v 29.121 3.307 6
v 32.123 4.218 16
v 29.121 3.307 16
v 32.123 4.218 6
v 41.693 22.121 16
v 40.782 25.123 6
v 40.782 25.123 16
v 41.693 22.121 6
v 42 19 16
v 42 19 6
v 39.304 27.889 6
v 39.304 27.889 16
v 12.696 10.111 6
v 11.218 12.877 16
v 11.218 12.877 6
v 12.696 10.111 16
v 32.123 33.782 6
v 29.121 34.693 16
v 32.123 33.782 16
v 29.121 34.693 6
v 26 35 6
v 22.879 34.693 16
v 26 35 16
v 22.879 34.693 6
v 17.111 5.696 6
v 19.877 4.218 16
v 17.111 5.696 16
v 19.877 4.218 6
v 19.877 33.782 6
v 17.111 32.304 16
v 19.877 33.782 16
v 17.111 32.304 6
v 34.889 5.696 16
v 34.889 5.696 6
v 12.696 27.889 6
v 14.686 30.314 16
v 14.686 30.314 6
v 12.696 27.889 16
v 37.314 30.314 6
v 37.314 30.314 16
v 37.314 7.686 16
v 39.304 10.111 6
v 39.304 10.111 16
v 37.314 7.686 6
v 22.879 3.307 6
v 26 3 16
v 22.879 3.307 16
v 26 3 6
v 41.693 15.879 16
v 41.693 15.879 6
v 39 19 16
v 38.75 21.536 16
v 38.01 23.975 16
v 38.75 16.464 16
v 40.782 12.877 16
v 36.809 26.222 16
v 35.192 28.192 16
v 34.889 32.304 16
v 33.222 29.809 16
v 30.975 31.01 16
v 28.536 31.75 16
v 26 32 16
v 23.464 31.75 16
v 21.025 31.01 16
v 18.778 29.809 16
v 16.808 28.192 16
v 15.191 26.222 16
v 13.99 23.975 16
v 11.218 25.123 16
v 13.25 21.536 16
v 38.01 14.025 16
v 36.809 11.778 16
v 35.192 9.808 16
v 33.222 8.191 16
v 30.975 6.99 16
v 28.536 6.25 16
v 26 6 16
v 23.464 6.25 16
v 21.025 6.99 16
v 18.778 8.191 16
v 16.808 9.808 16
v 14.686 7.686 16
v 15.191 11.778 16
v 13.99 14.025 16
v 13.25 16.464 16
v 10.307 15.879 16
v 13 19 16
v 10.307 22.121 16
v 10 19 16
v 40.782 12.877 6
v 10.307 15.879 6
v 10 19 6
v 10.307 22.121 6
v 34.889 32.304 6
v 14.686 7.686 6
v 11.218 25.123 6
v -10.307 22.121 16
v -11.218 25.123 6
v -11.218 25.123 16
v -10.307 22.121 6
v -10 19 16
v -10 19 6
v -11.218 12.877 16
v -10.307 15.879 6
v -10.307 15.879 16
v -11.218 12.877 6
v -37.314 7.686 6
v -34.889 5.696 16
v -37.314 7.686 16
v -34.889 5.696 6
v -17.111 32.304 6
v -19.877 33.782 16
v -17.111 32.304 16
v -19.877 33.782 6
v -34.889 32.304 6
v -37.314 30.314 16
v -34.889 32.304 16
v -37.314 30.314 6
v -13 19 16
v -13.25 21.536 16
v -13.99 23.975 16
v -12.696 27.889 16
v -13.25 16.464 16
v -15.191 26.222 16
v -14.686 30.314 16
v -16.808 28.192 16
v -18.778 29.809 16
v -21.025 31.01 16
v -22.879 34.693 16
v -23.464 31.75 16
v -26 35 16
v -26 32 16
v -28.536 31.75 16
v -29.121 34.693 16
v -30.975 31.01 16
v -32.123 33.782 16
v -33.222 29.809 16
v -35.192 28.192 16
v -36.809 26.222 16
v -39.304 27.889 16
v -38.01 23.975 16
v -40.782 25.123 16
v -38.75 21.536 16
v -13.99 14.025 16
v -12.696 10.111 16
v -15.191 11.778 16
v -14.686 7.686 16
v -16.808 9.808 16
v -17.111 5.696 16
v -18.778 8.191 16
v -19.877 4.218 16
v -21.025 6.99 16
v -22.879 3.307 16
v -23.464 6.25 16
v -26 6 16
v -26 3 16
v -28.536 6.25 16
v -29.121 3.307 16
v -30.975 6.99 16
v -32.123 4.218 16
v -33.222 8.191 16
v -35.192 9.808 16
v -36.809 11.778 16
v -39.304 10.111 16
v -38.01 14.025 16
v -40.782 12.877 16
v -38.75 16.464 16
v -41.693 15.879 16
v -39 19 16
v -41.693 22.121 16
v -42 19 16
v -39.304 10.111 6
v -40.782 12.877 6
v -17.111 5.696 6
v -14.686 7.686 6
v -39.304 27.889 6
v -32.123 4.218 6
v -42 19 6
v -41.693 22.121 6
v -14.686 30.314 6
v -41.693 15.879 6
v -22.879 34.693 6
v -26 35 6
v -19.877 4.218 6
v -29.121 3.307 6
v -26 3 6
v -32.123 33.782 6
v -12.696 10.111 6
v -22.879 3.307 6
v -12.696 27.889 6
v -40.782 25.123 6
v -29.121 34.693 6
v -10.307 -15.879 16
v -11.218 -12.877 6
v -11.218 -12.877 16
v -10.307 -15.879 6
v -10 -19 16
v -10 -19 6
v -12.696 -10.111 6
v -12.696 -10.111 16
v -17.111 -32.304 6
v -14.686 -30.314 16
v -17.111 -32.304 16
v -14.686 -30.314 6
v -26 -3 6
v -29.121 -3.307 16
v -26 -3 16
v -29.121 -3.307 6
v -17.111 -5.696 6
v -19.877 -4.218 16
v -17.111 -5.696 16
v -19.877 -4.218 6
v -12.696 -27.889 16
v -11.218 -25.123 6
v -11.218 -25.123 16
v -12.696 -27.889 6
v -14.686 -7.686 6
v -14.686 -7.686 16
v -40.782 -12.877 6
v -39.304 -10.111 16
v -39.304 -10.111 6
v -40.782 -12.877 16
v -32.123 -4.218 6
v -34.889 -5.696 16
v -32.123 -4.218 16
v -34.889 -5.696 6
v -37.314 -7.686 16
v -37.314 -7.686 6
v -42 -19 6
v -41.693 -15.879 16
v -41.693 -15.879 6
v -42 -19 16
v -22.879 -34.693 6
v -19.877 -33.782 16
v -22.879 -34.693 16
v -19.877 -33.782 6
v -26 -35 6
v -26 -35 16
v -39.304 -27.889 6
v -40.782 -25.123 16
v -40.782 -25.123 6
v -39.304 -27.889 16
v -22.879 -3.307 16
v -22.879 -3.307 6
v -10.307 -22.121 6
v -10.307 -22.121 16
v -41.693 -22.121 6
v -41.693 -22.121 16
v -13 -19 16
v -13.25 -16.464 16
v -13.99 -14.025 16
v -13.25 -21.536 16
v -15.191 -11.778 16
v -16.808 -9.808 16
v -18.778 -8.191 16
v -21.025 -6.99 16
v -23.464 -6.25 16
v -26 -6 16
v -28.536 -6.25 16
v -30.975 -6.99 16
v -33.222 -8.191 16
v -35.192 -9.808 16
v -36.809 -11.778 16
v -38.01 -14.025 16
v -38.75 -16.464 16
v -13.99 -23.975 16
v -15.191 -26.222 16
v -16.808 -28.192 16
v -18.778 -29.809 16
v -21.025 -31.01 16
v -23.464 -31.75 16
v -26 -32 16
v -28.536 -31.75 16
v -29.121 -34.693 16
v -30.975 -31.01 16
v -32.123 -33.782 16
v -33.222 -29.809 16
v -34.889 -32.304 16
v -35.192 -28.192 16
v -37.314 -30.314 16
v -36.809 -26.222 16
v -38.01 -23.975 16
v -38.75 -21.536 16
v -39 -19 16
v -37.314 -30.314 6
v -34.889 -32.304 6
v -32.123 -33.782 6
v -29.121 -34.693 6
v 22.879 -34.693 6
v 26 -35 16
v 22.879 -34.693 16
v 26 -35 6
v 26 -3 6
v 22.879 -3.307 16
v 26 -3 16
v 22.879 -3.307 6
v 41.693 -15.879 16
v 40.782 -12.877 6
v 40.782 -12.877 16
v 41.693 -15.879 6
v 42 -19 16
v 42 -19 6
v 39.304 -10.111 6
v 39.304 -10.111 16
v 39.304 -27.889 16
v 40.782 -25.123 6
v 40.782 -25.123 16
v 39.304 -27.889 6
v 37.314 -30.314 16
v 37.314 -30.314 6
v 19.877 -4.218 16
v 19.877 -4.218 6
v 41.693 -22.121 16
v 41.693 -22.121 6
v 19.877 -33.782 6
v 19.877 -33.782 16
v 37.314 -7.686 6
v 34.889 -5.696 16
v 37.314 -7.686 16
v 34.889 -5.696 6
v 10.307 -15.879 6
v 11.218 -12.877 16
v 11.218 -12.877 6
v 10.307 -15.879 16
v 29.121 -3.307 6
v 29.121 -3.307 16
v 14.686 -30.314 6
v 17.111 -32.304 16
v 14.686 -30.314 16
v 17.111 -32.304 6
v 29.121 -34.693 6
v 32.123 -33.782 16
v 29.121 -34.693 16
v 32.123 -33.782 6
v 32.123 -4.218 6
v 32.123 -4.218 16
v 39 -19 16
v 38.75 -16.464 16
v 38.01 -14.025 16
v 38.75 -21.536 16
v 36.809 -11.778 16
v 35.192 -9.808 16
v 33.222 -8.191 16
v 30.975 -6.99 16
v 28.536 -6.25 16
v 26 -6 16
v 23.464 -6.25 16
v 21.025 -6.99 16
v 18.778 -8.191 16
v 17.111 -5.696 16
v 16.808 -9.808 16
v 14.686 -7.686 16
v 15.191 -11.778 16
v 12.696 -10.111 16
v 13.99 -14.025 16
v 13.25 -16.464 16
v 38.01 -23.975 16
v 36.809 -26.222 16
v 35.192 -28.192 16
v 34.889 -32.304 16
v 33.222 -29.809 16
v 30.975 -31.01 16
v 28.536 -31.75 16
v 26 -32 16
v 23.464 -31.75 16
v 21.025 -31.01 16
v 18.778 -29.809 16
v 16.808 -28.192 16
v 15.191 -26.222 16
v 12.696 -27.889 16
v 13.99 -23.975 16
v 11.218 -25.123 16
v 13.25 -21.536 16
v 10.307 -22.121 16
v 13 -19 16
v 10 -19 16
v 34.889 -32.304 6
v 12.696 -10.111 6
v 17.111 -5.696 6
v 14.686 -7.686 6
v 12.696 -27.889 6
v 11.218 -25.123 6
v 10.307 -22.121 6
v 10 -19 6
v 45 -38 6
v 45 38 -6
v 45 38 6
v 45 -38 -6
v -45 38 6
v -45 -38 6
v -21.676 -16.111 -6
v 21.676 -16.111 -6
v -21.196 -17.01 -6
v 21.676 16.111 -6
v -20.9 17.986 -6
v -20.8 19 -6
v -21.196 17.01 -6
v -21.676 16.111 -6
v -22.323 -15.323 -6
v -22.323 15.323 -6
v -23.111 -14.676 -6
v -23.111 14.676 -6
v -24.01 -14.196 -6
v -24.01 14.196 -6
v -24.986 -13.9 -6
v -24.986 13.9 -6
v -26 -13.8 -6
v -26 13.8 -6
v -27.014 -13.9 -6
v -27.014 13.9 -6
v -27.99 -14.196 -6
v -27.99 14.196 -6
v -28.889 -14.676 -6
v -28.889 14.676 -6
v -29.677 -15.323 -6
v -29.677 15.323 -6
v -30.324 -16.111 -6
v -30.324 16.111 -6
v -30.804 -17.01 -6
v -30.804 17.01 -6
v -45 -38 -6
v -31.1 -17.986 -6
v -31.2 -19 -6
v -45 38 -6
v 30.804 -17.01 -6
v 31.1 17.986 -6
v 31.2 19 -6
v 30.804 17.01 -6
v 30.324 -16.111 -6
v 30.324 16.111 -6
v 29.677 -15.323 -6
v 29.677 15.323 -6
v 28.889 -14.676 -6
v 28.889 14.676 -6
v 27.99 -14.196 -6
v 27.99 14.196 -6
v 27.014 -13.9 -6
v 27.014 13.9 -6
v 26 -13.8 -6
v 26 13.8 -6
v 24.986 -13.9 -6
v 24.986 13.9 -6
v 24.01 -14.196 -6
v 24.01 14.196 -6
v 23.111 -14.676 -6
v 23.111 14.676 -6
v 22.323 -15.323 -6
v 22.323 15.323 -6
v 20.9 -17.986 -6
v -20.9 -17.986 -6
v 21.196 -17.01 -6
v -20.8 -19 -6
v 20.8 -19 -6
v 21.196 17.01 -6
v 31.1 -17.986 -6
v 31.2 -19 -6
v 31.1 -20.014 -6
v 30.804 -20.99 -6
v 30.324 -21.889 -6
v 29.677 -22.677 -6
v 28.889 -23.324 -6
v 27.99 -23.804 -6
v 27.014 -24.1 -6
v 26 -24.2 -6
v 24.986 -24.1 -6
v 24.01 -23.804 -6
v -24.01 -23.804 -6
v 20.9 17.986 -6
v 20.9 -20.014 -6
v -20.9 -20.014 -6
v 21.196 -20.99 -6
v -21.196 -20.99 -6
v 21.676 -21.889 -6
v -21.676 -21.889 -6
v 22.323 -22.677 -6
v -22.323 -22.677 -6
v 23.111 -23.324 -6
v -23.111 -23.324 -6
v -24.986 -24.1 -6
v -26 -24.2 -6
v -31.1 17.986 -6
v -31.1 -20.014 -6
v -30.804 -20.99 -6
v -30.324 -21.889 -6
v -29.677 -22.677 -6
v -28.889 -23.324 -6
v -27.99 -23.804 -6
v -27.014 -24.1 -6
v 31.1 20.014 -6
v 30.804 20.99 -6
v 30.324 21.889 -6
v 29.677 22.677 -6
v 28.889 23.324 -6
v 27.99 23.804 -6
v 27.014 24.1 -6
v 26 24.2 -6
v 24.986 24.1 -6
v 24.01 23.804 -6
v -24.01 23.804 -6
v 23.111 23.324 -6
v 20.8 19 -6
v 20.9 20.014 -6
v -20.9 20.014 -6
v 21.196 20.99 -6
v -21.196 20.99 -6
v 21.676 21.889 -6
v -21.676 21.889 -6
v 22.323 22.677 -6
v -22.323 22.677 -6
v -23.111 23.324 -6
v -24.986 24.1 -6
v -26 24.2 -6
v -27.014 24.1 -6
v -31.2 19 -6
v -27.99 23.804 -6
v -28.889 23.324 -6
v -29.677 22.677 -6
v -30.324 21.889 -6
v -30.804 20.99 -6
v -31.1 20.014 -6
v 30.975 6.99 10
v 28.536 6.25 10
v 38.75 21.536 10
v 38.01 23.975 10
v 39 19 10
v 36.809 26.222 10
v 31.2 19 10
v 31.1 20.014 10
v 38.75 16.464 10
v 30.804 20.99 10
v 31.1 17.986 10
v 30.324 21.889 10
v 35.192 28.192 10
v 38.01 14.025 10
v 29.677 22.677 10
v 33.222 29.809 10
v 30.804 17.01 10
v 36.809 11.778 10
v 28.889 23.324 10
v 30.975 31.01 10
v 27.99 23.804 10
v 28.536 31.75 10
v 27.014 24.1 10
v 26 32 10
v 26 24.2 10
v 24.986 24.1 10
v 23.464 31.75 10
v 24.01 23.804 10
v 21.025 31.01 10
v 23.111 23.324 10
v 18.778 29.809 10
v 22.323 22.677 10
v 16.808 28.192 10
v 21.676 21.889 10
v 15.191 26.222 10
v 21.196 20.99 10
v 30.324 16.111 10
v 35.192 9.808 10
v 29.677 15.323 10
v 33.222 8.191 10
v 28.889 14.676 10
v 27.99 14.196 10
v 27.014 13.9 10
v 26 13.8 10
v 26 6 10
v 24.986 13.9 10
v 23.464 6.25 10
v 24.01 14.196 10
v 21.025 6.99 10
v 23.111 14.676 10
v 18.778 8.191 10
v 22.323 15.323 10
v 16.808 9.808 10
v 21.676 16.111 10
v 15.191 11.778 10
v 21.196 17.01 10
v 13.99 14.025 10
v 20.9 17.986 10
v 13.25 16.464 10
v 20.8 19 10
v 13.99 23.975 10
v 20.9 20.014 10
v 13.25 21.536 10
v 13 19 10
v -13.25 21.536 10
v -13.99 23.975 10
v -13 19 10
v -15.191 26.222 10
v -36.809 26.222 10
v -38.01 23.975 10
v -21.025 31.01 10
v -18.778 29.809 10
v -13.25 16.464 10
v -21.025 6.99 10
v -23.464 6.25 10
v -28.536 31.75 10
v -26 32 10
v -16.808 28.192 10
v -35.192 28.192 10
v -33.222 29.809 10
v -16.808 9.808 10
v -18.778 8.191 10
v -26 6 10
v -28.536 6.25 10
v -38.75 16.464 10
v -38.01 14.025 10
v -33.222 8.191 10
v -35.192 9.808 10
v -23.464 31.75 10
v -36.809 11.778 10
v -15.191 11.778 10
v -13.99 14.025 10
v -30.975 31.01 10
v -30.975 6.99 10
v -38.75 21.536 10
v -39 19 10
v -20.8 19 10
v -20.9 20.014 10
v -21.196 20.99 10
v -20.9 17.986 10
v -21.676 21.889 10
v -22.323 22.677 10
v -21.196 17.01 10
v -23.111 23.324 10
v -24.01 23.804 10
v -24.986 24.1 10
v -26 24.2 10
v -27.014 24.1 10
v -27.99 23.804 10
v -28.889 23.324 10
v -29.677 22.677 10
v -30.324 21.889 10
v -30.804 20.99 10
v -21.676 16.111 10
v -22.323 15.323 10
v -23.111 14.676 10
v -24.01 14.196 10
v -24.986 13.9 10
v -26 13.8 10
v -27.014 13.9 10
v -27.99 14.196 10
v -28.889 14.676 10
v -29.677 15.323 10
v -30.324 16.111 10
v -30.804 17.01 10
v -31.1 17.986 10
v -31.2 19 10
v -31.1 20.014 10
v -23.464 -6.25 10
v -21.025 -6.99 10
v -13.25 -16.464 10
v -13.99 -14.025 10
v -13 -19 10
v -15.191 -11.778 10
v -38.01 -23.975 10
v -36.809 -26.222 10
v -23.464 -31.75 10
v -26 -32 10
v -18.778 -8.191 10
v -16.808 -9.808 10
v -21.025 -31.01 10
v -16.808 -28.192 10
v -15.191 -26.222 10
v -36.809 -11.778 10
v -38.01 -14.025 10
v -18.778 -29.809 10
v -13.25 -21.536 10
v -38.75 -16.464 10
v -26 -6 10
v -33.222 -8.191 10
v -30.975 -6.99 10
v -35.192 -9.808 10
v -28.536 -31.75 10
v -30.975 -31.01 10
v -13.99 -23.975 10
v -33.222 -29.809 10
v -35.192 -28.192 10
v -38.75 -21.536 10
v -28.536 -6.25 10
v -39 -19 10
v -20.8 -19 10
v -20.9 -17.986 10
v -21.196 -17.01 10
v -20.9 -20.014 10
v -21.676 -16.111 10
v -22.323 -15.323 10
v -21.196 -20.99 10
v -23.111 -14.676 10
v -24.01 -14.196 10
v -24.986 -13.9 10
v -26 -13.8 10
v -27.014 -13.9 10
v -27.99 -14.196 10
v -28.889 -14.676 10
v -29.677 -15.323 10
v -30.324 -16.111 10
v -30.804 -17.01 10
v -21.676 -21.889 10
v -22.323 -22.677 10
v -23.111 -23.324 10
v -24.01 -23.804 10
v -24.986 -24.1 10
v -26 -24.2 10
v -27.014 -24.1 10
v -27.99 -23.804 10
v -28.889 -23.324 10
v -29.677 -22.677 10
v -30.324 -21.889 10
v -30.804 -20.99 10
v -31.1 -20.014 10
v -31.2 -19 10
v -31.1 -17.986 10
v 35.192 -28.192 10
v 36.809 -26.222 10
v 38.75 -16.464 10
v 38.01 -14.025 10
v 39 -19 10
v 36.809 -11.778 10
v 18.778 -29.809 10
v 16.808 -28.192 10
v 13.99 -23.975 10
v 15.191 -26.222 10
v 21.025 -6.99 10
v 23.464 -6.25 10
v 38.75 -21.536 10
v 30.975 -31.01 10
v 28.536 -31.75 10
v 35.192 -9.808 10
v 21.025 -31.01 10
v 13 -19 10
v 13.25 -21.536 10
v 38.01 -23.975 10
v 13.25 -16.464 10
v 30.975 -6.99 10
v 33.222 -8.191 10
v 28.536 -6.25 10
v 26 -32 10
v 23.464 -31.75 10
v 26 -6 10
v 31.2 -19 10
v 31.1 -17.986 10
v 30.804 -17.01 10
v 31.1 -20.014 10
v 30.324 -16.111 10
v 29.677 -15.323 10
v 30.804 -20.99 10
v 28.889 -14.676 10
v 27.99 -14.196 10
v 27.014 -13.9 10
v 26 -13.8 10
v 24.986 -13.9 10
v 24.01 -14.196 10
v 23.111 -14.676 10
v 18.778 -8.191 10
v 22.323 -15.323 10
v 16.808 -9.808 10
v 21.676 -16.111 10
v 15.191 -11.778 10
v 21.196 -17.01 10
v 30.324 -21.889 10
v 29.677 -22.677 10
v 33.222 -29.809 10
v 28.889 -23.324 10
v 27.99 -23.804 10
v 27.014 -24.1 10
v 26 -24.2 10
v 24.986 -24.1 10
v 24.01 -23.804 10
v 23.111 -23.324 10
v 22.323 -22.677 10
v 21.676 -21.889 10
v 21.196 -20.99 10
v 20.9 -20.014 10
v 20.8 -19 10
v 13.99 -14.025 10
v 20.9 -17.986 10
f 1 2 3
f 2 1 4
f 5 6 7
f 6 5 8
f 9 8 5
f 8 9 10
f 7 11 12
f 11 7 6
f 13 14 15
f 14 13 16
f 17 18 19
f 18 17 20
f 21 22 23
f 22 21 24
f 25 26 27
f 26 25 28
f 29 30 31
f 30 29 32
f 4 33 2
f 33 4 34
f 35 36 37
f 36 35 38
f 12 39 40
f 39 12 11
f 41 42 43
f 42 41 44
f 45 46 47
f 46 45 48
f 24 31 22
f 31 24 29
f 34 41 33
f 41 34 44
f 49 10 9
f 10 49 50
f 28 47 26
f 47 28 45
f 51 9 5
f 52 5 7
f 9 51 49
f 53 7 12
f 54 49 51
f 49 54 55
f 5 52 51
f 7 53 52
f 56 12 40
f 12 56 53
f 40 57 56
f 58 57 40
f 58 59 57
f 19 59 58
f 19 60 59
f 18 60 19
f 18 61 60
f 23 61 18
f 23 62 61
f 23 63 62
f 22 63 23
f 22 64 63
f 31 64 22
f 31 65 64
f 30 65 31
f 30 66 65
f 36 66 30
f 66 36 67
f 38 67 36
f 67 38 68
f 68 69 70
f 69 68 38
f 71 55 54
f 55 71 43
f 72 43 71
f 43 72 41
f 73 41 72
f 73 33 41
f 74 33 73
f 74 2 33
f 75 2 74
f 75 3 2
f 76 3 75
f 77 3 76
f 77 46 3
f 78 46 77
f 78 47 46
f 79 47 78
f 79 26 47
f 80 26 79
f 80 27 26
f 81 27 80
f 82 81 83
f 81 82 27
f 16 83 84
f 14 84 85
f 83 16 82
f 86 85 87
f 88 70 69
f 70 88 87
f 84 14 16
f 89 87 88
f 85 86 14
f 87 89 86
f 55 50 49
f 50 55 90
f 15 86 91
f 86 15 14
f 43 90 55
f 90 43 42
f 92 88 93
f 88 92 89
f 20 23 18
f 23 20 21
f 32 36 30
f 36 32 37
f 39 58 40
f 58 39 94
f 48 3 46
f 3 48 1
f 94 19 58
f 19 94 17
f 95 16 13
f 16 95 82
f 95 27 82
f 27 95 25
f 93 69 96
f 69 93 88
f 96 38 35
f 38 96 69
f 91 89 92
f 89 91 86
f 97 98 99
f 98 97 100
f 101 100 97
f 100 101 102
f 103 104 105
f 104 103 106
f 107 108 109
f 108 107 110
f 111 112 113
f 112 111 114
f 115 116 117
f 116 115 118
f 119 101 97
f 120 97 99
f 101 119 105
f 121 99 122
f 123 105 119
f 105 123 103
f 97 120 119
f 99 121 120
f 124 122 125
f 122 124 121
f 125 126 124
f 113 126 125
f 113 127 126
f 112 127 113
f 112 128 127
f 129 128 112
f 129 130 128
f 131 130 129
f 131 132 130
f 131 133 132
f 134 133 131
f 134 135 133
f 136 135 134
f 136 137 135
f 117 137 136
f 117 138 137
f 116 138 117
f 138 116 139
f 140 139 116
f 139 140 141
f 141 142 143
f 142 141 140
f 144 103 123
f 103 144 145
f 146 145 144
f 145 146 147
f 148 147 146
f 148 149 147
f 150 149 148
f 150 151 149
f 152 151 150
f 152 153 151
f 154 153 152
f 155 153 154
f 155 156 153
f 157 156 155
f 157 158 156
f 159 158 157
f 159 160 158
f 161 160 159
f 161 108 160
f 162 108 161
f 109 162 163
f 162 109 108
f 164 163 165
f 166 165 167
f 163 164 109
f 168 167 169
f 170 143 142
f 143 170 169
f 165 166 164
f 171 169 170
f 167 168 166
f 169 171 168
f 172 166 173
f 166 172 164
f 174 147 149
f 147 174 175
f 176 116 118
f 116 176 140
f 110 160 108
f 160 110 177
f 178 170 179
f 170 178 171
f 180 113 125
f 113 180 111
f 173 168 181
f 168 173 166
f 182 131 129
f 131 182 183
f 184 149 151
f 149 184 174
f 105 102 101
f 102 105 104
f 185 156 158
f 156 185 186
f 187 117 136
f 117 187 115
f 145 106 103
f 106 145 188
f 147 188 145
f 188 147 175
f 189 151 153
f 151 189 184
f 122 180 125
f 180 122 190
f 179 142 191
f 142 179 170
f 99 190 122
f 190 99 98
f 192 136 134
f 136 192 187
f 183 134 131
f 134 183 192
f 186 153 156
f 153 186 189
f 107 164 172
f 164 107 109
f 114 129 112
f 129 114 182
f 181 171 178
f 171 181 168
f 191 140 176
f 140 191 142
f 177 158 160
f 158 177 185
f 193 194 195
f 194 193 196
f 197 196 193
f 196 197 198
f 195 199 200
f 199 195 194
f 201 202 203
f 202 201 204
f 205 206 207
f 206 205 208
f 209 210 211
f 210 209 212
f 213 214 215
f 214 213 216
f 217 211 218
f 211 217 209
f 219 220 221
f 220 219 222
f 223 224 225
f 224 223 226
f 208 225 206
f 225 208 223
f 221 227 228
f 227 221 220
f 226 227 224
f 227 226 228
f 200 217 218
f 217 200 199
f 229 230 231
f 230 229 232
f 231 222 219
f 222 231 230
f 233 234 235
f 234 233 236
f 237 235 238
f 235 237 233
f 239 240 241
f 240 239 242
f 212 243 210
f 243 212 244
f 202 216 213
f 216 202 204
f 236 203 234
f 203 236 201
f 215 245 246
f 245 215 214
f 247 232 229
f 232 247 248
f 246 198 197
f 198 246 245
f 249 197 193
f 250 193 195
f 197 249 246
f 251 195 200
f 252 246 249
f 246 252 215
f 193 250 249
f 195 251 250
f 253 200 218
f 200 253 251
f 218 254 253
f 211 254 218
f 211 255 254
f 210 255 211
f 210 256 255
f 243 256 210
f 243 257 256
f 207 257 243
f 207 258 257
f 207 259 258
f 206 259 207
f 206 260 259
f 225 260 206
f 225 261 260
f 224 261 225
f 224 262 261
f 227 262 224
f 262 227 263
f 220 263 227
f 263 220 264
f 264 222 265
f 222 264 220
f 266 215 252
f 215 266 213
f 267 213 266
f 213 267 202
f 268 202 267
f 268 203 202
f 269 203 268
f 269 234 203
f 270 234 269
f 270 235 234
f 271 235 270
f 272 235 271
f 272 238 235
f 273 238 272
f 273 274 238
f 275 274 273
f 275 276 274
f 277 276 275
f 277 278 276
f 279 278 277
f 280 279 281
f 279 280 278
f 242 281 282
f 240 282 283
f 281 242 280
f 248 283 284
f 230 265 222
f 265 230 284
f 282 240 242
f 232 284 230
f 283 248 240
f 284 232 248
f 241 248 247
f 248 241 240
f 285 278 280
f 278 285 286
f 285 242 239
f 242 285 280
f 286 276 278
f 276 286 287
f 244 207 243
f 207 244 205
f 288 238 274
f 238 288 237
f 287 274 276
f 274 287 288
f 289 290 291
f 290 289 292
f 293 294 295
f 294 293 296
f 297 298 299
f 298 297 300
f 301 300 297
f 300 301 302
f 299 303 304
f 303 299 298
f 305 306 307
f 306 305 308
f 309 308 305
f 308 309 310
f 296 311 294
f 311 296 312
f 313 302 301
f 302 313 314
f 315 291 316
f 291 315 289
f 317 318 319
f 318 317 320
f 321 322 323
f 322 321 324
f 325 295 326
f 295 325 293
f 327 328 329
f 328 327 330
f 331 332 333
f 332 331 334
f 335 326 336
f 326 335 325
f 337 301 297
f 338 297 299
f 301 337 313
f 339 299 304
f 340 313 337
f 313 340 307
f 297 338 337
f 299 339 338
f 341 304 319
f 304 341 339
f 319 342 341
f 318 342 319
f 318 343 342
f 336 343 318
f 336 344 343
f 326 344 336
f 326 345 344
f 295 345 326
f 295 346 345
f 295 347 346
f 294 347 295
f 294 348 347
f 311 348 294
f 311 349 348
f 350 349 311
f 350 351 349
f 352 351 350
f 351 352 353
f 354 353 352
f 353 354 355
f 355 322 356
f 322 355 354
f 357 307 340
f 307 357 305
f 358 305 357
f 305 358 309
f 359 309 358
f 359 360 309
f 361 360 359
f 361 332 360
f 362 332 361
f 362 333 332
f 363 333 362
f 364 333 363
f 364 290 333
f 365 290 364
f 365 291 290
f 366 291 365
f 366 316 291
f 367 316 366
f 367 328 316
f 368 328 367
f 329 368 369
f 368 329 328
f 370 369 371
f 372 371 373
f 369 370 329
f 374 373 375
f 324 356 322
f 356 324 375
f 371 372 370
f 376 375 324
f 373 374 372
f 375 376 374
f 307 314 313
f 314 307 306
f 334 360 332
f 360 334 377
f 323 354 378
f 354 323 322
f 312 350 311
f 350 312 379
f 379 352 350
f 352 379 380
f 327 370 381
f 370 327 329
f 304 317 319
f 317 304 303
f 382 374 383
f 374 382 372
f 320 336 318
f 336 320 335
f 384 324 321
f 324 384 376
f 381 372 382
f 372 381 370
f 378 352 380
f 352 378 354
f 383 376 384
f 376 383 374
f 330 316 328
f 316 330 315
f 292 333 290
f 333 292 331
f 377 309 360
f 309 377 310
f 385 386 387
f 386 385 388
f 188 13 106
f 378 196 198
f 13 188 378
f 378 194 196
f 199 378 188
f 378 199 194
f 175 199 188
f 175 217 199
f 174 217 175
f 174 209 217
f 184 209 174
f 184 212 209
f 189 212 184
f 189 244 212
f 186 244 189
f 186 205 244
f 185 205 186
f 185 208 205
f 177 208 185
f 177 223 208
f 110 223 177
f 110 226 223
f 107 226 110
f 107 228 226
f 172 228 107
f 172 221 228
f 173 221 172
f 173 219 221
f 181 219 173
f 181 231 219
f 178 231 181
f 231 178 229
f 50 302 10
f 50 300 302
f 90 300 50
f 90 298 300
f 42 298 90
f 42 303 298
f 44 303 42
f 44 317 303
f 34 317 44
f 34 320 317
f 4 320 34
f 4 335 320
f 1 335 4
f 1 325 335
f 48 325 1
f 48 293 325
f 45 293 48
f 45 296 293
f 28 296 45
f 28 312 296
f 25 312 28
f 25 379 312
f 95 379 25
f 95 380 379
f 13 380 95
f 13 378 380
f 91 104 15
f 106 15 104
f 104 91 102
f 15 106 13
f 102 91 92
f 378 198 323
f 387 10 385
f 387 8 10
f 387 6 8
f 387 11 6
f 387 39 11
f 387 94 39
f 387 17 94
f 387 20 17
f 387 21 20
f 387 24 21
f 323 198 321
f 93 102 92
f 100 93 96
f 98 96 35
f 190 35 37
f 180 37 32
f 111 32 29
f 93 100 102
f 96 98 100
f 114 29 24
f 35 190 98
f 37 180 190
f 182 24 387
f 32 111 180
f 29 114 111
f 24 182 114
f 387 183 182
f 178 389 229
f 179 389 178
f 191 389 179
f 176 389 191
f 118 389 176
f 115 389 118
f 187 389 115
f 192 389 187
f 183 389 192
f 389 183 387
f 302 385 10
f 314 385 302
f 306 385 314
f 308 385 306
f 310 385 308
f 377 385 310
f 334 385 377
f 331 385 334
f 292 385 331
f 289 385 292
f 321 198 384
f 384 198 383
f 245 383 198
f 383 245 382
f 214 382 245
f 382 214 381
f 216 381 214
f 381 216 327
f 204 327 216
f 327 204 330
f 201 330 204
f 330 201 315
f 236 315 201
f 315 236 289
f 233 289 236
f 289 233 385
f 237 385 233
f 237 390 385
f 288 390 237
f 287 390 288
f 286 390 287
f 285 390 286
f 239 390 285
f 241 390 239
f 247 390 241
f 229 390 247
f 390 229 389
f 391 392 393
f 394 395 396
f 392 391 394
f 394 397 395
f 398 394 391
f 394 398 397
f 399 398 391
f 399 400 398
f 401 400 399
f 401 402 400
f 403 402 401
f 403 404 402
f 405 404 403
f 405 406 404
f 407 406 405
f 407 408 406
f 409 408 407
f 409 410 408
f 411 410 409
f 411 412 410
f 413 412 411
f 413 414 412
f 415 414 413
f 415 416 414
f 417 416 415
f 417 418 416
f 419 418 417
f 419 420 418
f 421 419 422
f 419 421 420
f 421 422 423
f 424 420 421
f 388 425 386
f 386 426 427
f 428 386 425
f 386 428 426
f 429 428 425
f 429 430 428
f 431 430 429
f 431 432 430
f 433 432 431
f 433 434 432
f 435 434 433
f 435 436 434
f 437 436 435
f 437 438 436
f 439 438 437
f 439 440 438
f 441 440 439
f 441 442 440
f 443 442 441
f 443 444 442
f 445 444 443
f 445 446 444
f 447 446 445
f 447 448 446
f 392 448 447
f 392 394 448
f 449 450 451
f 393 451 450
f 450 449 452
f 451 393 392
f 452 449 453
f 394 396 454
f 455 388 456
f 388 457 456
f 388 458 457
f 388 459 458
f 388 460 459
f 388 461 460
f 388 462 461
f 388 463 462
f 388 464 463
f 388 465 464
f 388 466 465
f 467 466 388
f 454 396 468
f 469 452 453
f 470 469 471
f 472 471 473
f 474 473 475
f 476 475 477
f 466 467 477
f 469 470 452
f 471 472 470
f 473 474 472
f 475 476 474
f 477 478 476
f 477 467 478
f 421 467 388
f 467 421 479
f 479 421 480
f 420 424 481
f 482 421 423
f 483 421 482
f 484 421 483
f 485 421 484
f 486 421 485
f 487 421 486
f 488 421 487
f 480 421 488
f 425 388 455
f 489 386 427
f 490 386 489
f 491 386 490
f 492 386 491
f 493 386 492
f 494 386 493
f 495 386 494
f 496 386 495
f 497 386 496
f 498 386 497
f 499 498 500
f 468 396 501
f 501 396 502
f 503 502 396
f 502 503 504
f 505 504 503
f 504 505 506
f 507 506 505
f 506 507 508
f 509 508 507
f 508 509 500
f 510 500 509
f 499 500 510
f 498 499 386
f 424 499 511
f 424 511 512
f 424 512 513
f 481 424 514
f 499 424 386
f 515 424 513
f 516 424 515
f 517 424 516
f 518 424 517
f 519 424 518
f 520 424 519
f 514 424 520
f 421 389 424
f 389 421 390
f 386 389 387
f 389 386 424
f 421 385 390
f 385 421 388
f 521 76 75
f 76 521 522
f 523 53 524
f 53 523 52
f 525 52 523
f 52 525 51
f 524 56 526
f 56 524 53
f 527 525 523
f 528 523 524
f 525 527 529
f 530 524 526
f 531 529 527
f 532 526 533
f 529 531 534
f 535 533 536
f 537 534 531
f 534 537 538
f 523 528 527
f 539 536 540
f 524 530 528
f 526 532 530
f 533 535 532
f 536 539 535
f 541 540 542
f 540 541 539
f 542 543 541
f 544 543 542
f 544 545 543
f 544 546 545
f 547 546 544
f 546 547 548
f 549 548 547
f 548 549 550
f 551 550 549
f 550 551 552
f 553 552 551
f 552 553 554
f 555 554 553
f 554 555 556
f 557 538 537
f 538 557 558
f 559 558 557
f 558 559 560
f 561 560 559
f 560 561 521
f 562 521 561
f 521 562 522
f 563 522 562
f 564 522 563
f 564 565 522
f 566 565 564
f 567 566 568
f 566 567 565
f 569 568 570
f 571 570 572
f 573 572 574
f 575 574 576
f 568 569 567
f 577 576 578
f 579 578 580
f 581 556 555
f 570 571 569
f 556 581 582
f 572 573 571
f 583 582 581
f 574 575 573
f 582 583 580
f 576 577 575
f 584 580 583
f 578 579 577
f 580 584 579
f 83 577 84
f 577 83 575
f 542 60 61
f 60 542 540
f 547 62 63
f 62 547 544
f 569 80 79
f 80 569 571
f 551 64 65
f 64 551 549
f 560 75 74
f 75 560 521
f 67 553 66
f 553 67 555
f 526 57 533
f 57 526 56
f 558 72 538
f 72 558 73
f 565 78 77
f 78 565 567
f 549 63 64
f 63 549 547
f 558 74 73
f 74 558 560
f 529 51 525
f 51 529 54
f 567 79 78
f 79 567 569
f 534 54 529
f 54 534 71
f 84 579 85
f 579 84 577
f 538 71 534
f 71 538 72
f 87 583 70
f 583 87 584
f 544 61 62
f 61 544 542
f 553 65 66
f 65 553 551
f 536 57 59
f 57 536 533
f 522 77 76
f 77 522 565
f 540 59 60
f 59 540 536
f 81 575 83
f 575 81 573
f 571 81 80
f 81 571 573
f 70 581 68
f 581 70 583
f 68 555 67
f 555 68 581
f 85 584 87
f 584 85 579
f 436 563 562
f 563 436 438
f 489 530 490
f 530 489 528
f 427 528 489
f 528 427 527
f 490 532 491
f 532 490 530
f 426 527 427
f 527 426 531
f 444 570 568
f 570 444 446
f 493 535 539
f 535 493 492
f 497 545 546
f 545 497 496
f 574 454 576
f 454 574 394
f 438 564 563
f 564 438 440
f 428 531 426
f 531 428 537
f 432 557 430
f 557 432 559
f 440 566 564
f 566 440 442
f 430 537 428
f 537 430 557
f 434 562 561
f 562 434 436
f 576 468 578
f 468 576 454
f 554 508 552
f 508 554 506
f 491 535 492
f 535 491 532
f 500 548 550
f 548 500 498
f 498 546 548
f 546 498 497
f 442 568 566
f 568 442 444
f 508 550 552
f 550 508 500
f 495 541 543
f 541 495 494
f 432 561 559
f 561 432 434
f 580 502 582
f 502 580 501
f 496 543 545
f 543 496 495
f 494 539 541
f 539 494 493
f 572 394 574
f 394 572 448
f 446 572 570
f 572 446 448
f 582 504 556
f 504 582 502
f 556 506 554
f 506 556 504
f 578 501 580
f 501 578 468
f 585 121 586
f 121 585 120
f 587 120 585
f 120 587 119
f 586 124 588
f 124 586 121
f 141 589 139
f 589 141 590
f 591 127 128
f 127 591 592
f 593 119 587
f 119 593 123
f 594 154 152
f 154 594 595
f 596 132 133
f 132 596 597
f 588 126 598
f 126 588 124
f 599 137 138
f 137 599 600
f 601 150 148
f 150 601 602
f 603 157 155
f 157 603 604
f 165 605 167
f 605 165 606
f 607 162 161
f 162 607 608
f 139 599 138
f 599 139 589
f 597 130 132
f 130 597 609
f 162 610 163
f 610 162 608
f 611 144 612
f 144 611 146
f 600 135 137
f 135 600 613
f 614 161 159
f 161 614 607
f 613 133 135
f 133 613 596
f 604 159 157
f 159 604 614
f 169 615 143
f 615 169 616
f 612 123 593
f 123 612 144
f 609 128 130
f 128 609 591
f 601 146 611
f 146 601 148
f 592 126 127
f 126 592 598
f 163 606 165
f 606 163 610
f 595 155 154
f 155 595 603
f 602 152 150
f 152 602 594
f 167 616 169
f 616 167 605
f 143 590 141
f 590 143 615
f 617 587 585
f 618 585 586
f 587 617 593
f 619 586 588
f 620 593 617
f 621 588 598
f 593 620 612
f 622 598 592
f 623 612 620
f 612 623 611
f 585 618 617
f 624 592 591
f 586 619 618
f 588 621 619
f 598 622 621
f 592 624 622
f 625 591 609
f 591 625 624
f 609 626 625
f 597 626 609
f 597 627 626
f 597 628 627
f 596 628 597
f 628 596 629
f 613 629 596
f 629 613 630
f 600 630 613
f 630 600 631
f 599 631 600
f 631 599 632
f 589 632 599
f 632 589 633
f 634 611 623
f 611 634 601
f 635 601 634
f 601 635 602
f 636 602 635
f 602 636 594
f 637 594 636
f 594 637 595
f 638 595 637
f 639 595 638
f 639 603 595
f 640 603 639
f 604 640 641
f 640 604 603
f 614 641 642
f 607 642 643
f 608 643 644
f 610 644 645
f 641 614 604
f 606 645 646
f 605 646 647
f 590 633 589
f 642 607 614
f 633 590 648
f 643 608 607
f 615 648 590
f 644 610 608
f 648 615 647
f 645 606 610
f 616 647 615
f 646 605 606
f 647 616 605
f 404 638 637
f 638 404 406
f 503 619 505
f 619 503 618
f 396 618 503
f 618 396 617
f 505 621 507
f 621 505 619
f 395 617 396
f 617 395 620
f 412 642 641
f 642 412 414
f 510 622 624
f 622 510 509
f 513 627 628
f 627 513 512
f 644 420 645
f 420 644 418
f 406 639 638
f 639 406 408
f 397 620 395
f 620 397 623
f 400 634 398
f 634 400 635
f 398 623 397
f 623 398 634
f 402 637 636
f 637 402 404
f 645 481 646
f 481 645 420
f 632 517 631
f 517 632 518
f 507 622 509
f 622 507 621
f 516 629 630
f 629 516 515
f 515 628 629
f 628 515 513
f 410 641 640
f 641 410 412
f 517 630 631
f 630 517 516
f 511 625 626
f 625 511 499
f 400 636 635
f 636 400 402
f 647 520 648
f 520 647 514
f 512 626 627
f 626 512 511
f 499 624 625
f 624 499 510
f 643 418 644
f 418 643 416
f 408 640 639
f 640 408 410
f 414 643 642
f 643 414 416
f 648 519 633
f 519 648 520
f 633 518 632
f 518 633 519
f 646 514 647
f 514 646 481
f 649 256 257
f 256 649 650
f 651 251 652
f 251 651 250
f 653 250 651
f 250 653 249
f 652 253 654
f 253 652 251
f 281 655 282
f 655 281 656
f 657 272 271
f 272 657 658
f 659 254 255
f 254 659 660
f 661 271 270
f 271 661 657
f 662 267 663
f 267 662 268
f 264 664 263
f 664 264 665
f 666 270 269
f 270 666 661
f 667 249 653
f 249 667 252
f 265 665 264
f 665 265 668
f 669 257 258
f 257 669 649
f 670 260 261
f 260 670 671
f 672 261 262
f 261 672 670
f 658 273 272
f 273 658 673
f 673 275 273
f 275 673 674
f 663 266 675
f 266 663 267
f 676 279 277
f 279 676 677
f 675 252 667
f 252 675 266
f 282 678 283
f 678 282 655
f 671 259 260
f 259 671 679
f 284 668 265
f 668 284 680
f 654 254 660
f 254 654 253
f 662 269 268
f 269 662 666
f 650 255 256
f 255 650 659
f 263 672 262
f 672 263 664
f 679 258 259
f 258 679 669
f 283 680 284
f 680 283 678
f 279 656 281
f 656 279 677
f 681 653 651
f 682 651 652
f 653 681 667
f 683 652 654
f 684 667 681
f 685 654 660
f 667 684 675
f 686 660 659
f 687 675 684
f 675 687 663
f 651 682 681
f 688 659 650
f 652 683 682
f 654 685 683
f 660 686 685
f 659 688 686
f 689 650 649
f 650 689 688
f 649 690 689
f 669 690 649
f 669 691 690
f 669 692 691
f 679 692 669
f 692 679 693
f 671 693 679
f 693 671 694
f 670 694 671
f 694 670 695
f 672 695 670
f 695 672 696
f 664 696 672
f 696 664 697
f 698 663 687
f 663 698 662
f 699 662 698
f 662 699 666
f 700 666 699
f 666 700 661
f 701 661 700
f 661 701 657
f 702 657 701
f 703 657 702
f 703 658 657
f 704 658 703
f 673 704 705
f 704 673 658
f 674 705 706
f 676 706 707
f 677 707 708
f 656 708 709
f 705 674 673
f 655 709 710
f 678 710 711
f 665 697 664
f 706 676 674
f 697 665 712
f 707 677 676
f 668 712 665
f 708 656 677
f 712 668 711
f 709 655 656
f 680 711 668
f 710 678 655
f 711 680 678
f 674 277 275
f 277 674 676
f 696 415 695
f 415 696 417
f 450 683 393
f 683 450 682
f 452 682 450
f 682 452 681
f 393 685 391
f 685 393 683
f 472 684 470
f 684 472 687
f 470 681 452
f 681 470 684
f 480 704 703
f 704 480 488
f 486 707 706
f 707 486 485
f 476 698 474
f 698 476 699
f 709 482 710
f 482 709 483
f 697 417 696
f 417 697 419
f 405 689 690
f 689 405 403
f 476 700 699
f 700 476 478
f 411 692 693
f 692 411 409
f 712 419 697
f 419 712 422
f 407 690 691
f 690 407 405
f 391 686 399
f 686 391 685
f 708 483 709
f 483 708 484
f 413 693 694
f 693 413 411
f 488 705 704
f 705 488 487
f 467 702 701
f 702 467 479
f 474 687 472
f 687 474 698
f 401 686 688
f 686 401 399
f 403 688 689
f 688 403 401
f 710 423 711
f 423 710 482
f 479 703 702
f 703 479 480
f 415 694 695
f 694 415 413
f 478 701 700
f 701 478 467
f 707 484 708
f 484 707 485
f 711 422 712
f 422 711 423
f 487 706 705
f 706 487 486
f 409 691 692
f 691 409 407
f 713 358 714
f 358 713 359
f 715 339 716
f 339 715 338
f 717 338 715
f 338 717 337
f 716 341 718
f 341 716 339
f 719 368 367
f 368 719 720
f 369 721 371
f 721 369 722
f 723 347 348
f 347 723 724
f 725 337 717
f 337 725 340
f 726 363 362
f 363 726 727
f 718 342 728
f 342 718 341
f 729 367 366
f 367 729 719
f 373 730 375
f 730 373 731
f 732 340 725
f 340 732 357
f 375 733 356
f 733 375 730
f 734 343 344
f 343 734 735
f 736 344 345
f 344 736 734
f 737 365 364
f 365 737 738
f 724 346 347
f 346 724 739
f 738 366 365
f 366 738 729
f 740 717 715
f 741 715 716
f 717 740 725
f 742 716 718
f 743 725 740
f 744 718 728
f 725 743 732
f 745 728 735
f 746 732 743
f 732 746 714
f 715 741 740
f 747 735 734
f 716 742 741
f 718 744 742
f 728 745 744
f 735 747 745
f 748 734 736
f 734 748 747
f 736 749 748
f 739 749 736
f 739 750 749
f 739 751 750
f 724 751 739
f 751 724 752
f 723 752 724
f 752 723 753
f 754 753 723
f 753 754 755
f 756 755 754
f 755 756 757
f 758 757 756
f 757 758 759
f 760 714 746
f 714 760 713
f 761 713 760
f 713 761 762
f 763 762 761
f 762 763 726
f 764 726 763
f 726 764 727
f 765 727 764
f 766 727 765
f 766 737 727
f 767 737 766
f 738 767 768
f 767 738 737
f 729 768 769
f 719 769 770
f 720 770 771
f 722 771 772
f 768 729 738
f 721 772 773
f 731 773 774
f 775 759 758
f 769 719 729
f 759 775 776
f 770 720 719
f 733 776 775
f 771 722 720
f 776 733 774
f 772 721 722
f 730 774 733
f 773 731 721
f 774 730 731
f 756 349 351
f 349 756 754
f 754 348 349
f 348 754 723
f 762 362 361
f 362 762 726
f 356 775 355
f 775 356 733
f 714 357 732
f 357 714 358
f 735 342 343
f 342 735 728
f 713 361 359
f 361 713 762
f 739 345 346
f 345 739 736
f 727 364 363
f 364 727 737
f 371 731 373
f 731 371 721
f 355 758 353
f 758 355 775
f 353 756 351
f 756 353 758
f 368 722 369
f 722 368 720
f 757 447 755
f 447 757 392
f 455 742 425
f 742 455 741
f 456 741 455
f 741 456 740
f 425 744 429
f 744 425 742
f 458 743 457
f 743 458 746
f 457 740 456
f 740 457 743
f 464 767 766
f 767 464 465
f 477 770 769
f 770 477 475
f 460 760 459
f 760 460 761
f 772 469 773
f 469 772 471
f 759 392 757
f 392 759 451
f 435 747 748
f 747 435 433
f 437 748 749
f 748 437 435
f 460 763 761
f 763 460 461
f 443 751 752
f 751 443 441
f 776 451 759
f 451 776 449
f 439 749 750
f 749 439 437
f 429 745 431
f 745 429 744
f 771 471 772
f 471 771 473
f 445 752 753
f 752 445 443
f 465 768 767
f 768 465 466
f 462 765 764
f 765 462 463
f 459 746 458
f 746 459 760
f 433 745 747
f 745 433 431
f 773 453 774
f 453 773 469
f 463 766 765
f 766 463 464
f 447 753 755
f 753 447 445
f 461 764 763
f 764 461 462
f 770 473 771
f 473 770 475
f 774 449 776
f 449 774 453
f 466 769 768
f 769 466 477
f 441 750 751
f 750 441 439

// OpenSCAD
$fn = 32;

// ----------------------------------------------------------------------
// Socket pad plate
// bosses with counterbored sockets for the screws
// ----------------------------------------------------------------------

// --- parameters (mm) ---
base_t = 12;           // base plate thickness
boss_h = 10;           // boss height above the base plate
boss_d = 32;           // boss diameter
socket_d = 26;         // socket diameter
socket_depth = 6;      // socket depth from the boss face
bolt_d = 10.4;         // screw clearance hole through the socket floor
plate = [90, 76, 12];  // overall size (x, y, z)
edge = 19;             // boss centre offset from the plate edge
pads = 4;              // boss count, one per corner

// --- derived feature positions (mm) ---
height = base_t + boss_h;        // = 22   overall height of the part
corner_x = plate[0] / 2 - edge;  // = 26   boss centre X
corner_y = plate[1] / 2 - edge;  // = 19   boss centre Y
feature_centers = [
  [corner_x, corner_y],
  [-corner_x, corner_y],
  [-corner_x, -corner_y],
  [corner_x, -corner_y]
];   // boss centres: sockets, holes and the pads themselves are placed from here

// base plate, bosses on feature_centers, socket + through hole in each
difference() {
  union() {
    cube(plate, center = true);
    for (centre = feature_centers)
      translate([centre[0], centre[1], plate[2] / 2 - 1])
        cylinder(d = boss_d, h = boss_h + 1);
  }
  for (centre = feature_centers) {
    translate([centre[0], centre[1], plate[2] / 2 + boss_h - socket_depth])
      cylinder(d = socket_d, h = socket_depth + 1);
    translate([centre[0], centre[1], -height])
      cylinder(d = bolt_d, h = 2 * height + 2);  // through the socket floor
  }
}
